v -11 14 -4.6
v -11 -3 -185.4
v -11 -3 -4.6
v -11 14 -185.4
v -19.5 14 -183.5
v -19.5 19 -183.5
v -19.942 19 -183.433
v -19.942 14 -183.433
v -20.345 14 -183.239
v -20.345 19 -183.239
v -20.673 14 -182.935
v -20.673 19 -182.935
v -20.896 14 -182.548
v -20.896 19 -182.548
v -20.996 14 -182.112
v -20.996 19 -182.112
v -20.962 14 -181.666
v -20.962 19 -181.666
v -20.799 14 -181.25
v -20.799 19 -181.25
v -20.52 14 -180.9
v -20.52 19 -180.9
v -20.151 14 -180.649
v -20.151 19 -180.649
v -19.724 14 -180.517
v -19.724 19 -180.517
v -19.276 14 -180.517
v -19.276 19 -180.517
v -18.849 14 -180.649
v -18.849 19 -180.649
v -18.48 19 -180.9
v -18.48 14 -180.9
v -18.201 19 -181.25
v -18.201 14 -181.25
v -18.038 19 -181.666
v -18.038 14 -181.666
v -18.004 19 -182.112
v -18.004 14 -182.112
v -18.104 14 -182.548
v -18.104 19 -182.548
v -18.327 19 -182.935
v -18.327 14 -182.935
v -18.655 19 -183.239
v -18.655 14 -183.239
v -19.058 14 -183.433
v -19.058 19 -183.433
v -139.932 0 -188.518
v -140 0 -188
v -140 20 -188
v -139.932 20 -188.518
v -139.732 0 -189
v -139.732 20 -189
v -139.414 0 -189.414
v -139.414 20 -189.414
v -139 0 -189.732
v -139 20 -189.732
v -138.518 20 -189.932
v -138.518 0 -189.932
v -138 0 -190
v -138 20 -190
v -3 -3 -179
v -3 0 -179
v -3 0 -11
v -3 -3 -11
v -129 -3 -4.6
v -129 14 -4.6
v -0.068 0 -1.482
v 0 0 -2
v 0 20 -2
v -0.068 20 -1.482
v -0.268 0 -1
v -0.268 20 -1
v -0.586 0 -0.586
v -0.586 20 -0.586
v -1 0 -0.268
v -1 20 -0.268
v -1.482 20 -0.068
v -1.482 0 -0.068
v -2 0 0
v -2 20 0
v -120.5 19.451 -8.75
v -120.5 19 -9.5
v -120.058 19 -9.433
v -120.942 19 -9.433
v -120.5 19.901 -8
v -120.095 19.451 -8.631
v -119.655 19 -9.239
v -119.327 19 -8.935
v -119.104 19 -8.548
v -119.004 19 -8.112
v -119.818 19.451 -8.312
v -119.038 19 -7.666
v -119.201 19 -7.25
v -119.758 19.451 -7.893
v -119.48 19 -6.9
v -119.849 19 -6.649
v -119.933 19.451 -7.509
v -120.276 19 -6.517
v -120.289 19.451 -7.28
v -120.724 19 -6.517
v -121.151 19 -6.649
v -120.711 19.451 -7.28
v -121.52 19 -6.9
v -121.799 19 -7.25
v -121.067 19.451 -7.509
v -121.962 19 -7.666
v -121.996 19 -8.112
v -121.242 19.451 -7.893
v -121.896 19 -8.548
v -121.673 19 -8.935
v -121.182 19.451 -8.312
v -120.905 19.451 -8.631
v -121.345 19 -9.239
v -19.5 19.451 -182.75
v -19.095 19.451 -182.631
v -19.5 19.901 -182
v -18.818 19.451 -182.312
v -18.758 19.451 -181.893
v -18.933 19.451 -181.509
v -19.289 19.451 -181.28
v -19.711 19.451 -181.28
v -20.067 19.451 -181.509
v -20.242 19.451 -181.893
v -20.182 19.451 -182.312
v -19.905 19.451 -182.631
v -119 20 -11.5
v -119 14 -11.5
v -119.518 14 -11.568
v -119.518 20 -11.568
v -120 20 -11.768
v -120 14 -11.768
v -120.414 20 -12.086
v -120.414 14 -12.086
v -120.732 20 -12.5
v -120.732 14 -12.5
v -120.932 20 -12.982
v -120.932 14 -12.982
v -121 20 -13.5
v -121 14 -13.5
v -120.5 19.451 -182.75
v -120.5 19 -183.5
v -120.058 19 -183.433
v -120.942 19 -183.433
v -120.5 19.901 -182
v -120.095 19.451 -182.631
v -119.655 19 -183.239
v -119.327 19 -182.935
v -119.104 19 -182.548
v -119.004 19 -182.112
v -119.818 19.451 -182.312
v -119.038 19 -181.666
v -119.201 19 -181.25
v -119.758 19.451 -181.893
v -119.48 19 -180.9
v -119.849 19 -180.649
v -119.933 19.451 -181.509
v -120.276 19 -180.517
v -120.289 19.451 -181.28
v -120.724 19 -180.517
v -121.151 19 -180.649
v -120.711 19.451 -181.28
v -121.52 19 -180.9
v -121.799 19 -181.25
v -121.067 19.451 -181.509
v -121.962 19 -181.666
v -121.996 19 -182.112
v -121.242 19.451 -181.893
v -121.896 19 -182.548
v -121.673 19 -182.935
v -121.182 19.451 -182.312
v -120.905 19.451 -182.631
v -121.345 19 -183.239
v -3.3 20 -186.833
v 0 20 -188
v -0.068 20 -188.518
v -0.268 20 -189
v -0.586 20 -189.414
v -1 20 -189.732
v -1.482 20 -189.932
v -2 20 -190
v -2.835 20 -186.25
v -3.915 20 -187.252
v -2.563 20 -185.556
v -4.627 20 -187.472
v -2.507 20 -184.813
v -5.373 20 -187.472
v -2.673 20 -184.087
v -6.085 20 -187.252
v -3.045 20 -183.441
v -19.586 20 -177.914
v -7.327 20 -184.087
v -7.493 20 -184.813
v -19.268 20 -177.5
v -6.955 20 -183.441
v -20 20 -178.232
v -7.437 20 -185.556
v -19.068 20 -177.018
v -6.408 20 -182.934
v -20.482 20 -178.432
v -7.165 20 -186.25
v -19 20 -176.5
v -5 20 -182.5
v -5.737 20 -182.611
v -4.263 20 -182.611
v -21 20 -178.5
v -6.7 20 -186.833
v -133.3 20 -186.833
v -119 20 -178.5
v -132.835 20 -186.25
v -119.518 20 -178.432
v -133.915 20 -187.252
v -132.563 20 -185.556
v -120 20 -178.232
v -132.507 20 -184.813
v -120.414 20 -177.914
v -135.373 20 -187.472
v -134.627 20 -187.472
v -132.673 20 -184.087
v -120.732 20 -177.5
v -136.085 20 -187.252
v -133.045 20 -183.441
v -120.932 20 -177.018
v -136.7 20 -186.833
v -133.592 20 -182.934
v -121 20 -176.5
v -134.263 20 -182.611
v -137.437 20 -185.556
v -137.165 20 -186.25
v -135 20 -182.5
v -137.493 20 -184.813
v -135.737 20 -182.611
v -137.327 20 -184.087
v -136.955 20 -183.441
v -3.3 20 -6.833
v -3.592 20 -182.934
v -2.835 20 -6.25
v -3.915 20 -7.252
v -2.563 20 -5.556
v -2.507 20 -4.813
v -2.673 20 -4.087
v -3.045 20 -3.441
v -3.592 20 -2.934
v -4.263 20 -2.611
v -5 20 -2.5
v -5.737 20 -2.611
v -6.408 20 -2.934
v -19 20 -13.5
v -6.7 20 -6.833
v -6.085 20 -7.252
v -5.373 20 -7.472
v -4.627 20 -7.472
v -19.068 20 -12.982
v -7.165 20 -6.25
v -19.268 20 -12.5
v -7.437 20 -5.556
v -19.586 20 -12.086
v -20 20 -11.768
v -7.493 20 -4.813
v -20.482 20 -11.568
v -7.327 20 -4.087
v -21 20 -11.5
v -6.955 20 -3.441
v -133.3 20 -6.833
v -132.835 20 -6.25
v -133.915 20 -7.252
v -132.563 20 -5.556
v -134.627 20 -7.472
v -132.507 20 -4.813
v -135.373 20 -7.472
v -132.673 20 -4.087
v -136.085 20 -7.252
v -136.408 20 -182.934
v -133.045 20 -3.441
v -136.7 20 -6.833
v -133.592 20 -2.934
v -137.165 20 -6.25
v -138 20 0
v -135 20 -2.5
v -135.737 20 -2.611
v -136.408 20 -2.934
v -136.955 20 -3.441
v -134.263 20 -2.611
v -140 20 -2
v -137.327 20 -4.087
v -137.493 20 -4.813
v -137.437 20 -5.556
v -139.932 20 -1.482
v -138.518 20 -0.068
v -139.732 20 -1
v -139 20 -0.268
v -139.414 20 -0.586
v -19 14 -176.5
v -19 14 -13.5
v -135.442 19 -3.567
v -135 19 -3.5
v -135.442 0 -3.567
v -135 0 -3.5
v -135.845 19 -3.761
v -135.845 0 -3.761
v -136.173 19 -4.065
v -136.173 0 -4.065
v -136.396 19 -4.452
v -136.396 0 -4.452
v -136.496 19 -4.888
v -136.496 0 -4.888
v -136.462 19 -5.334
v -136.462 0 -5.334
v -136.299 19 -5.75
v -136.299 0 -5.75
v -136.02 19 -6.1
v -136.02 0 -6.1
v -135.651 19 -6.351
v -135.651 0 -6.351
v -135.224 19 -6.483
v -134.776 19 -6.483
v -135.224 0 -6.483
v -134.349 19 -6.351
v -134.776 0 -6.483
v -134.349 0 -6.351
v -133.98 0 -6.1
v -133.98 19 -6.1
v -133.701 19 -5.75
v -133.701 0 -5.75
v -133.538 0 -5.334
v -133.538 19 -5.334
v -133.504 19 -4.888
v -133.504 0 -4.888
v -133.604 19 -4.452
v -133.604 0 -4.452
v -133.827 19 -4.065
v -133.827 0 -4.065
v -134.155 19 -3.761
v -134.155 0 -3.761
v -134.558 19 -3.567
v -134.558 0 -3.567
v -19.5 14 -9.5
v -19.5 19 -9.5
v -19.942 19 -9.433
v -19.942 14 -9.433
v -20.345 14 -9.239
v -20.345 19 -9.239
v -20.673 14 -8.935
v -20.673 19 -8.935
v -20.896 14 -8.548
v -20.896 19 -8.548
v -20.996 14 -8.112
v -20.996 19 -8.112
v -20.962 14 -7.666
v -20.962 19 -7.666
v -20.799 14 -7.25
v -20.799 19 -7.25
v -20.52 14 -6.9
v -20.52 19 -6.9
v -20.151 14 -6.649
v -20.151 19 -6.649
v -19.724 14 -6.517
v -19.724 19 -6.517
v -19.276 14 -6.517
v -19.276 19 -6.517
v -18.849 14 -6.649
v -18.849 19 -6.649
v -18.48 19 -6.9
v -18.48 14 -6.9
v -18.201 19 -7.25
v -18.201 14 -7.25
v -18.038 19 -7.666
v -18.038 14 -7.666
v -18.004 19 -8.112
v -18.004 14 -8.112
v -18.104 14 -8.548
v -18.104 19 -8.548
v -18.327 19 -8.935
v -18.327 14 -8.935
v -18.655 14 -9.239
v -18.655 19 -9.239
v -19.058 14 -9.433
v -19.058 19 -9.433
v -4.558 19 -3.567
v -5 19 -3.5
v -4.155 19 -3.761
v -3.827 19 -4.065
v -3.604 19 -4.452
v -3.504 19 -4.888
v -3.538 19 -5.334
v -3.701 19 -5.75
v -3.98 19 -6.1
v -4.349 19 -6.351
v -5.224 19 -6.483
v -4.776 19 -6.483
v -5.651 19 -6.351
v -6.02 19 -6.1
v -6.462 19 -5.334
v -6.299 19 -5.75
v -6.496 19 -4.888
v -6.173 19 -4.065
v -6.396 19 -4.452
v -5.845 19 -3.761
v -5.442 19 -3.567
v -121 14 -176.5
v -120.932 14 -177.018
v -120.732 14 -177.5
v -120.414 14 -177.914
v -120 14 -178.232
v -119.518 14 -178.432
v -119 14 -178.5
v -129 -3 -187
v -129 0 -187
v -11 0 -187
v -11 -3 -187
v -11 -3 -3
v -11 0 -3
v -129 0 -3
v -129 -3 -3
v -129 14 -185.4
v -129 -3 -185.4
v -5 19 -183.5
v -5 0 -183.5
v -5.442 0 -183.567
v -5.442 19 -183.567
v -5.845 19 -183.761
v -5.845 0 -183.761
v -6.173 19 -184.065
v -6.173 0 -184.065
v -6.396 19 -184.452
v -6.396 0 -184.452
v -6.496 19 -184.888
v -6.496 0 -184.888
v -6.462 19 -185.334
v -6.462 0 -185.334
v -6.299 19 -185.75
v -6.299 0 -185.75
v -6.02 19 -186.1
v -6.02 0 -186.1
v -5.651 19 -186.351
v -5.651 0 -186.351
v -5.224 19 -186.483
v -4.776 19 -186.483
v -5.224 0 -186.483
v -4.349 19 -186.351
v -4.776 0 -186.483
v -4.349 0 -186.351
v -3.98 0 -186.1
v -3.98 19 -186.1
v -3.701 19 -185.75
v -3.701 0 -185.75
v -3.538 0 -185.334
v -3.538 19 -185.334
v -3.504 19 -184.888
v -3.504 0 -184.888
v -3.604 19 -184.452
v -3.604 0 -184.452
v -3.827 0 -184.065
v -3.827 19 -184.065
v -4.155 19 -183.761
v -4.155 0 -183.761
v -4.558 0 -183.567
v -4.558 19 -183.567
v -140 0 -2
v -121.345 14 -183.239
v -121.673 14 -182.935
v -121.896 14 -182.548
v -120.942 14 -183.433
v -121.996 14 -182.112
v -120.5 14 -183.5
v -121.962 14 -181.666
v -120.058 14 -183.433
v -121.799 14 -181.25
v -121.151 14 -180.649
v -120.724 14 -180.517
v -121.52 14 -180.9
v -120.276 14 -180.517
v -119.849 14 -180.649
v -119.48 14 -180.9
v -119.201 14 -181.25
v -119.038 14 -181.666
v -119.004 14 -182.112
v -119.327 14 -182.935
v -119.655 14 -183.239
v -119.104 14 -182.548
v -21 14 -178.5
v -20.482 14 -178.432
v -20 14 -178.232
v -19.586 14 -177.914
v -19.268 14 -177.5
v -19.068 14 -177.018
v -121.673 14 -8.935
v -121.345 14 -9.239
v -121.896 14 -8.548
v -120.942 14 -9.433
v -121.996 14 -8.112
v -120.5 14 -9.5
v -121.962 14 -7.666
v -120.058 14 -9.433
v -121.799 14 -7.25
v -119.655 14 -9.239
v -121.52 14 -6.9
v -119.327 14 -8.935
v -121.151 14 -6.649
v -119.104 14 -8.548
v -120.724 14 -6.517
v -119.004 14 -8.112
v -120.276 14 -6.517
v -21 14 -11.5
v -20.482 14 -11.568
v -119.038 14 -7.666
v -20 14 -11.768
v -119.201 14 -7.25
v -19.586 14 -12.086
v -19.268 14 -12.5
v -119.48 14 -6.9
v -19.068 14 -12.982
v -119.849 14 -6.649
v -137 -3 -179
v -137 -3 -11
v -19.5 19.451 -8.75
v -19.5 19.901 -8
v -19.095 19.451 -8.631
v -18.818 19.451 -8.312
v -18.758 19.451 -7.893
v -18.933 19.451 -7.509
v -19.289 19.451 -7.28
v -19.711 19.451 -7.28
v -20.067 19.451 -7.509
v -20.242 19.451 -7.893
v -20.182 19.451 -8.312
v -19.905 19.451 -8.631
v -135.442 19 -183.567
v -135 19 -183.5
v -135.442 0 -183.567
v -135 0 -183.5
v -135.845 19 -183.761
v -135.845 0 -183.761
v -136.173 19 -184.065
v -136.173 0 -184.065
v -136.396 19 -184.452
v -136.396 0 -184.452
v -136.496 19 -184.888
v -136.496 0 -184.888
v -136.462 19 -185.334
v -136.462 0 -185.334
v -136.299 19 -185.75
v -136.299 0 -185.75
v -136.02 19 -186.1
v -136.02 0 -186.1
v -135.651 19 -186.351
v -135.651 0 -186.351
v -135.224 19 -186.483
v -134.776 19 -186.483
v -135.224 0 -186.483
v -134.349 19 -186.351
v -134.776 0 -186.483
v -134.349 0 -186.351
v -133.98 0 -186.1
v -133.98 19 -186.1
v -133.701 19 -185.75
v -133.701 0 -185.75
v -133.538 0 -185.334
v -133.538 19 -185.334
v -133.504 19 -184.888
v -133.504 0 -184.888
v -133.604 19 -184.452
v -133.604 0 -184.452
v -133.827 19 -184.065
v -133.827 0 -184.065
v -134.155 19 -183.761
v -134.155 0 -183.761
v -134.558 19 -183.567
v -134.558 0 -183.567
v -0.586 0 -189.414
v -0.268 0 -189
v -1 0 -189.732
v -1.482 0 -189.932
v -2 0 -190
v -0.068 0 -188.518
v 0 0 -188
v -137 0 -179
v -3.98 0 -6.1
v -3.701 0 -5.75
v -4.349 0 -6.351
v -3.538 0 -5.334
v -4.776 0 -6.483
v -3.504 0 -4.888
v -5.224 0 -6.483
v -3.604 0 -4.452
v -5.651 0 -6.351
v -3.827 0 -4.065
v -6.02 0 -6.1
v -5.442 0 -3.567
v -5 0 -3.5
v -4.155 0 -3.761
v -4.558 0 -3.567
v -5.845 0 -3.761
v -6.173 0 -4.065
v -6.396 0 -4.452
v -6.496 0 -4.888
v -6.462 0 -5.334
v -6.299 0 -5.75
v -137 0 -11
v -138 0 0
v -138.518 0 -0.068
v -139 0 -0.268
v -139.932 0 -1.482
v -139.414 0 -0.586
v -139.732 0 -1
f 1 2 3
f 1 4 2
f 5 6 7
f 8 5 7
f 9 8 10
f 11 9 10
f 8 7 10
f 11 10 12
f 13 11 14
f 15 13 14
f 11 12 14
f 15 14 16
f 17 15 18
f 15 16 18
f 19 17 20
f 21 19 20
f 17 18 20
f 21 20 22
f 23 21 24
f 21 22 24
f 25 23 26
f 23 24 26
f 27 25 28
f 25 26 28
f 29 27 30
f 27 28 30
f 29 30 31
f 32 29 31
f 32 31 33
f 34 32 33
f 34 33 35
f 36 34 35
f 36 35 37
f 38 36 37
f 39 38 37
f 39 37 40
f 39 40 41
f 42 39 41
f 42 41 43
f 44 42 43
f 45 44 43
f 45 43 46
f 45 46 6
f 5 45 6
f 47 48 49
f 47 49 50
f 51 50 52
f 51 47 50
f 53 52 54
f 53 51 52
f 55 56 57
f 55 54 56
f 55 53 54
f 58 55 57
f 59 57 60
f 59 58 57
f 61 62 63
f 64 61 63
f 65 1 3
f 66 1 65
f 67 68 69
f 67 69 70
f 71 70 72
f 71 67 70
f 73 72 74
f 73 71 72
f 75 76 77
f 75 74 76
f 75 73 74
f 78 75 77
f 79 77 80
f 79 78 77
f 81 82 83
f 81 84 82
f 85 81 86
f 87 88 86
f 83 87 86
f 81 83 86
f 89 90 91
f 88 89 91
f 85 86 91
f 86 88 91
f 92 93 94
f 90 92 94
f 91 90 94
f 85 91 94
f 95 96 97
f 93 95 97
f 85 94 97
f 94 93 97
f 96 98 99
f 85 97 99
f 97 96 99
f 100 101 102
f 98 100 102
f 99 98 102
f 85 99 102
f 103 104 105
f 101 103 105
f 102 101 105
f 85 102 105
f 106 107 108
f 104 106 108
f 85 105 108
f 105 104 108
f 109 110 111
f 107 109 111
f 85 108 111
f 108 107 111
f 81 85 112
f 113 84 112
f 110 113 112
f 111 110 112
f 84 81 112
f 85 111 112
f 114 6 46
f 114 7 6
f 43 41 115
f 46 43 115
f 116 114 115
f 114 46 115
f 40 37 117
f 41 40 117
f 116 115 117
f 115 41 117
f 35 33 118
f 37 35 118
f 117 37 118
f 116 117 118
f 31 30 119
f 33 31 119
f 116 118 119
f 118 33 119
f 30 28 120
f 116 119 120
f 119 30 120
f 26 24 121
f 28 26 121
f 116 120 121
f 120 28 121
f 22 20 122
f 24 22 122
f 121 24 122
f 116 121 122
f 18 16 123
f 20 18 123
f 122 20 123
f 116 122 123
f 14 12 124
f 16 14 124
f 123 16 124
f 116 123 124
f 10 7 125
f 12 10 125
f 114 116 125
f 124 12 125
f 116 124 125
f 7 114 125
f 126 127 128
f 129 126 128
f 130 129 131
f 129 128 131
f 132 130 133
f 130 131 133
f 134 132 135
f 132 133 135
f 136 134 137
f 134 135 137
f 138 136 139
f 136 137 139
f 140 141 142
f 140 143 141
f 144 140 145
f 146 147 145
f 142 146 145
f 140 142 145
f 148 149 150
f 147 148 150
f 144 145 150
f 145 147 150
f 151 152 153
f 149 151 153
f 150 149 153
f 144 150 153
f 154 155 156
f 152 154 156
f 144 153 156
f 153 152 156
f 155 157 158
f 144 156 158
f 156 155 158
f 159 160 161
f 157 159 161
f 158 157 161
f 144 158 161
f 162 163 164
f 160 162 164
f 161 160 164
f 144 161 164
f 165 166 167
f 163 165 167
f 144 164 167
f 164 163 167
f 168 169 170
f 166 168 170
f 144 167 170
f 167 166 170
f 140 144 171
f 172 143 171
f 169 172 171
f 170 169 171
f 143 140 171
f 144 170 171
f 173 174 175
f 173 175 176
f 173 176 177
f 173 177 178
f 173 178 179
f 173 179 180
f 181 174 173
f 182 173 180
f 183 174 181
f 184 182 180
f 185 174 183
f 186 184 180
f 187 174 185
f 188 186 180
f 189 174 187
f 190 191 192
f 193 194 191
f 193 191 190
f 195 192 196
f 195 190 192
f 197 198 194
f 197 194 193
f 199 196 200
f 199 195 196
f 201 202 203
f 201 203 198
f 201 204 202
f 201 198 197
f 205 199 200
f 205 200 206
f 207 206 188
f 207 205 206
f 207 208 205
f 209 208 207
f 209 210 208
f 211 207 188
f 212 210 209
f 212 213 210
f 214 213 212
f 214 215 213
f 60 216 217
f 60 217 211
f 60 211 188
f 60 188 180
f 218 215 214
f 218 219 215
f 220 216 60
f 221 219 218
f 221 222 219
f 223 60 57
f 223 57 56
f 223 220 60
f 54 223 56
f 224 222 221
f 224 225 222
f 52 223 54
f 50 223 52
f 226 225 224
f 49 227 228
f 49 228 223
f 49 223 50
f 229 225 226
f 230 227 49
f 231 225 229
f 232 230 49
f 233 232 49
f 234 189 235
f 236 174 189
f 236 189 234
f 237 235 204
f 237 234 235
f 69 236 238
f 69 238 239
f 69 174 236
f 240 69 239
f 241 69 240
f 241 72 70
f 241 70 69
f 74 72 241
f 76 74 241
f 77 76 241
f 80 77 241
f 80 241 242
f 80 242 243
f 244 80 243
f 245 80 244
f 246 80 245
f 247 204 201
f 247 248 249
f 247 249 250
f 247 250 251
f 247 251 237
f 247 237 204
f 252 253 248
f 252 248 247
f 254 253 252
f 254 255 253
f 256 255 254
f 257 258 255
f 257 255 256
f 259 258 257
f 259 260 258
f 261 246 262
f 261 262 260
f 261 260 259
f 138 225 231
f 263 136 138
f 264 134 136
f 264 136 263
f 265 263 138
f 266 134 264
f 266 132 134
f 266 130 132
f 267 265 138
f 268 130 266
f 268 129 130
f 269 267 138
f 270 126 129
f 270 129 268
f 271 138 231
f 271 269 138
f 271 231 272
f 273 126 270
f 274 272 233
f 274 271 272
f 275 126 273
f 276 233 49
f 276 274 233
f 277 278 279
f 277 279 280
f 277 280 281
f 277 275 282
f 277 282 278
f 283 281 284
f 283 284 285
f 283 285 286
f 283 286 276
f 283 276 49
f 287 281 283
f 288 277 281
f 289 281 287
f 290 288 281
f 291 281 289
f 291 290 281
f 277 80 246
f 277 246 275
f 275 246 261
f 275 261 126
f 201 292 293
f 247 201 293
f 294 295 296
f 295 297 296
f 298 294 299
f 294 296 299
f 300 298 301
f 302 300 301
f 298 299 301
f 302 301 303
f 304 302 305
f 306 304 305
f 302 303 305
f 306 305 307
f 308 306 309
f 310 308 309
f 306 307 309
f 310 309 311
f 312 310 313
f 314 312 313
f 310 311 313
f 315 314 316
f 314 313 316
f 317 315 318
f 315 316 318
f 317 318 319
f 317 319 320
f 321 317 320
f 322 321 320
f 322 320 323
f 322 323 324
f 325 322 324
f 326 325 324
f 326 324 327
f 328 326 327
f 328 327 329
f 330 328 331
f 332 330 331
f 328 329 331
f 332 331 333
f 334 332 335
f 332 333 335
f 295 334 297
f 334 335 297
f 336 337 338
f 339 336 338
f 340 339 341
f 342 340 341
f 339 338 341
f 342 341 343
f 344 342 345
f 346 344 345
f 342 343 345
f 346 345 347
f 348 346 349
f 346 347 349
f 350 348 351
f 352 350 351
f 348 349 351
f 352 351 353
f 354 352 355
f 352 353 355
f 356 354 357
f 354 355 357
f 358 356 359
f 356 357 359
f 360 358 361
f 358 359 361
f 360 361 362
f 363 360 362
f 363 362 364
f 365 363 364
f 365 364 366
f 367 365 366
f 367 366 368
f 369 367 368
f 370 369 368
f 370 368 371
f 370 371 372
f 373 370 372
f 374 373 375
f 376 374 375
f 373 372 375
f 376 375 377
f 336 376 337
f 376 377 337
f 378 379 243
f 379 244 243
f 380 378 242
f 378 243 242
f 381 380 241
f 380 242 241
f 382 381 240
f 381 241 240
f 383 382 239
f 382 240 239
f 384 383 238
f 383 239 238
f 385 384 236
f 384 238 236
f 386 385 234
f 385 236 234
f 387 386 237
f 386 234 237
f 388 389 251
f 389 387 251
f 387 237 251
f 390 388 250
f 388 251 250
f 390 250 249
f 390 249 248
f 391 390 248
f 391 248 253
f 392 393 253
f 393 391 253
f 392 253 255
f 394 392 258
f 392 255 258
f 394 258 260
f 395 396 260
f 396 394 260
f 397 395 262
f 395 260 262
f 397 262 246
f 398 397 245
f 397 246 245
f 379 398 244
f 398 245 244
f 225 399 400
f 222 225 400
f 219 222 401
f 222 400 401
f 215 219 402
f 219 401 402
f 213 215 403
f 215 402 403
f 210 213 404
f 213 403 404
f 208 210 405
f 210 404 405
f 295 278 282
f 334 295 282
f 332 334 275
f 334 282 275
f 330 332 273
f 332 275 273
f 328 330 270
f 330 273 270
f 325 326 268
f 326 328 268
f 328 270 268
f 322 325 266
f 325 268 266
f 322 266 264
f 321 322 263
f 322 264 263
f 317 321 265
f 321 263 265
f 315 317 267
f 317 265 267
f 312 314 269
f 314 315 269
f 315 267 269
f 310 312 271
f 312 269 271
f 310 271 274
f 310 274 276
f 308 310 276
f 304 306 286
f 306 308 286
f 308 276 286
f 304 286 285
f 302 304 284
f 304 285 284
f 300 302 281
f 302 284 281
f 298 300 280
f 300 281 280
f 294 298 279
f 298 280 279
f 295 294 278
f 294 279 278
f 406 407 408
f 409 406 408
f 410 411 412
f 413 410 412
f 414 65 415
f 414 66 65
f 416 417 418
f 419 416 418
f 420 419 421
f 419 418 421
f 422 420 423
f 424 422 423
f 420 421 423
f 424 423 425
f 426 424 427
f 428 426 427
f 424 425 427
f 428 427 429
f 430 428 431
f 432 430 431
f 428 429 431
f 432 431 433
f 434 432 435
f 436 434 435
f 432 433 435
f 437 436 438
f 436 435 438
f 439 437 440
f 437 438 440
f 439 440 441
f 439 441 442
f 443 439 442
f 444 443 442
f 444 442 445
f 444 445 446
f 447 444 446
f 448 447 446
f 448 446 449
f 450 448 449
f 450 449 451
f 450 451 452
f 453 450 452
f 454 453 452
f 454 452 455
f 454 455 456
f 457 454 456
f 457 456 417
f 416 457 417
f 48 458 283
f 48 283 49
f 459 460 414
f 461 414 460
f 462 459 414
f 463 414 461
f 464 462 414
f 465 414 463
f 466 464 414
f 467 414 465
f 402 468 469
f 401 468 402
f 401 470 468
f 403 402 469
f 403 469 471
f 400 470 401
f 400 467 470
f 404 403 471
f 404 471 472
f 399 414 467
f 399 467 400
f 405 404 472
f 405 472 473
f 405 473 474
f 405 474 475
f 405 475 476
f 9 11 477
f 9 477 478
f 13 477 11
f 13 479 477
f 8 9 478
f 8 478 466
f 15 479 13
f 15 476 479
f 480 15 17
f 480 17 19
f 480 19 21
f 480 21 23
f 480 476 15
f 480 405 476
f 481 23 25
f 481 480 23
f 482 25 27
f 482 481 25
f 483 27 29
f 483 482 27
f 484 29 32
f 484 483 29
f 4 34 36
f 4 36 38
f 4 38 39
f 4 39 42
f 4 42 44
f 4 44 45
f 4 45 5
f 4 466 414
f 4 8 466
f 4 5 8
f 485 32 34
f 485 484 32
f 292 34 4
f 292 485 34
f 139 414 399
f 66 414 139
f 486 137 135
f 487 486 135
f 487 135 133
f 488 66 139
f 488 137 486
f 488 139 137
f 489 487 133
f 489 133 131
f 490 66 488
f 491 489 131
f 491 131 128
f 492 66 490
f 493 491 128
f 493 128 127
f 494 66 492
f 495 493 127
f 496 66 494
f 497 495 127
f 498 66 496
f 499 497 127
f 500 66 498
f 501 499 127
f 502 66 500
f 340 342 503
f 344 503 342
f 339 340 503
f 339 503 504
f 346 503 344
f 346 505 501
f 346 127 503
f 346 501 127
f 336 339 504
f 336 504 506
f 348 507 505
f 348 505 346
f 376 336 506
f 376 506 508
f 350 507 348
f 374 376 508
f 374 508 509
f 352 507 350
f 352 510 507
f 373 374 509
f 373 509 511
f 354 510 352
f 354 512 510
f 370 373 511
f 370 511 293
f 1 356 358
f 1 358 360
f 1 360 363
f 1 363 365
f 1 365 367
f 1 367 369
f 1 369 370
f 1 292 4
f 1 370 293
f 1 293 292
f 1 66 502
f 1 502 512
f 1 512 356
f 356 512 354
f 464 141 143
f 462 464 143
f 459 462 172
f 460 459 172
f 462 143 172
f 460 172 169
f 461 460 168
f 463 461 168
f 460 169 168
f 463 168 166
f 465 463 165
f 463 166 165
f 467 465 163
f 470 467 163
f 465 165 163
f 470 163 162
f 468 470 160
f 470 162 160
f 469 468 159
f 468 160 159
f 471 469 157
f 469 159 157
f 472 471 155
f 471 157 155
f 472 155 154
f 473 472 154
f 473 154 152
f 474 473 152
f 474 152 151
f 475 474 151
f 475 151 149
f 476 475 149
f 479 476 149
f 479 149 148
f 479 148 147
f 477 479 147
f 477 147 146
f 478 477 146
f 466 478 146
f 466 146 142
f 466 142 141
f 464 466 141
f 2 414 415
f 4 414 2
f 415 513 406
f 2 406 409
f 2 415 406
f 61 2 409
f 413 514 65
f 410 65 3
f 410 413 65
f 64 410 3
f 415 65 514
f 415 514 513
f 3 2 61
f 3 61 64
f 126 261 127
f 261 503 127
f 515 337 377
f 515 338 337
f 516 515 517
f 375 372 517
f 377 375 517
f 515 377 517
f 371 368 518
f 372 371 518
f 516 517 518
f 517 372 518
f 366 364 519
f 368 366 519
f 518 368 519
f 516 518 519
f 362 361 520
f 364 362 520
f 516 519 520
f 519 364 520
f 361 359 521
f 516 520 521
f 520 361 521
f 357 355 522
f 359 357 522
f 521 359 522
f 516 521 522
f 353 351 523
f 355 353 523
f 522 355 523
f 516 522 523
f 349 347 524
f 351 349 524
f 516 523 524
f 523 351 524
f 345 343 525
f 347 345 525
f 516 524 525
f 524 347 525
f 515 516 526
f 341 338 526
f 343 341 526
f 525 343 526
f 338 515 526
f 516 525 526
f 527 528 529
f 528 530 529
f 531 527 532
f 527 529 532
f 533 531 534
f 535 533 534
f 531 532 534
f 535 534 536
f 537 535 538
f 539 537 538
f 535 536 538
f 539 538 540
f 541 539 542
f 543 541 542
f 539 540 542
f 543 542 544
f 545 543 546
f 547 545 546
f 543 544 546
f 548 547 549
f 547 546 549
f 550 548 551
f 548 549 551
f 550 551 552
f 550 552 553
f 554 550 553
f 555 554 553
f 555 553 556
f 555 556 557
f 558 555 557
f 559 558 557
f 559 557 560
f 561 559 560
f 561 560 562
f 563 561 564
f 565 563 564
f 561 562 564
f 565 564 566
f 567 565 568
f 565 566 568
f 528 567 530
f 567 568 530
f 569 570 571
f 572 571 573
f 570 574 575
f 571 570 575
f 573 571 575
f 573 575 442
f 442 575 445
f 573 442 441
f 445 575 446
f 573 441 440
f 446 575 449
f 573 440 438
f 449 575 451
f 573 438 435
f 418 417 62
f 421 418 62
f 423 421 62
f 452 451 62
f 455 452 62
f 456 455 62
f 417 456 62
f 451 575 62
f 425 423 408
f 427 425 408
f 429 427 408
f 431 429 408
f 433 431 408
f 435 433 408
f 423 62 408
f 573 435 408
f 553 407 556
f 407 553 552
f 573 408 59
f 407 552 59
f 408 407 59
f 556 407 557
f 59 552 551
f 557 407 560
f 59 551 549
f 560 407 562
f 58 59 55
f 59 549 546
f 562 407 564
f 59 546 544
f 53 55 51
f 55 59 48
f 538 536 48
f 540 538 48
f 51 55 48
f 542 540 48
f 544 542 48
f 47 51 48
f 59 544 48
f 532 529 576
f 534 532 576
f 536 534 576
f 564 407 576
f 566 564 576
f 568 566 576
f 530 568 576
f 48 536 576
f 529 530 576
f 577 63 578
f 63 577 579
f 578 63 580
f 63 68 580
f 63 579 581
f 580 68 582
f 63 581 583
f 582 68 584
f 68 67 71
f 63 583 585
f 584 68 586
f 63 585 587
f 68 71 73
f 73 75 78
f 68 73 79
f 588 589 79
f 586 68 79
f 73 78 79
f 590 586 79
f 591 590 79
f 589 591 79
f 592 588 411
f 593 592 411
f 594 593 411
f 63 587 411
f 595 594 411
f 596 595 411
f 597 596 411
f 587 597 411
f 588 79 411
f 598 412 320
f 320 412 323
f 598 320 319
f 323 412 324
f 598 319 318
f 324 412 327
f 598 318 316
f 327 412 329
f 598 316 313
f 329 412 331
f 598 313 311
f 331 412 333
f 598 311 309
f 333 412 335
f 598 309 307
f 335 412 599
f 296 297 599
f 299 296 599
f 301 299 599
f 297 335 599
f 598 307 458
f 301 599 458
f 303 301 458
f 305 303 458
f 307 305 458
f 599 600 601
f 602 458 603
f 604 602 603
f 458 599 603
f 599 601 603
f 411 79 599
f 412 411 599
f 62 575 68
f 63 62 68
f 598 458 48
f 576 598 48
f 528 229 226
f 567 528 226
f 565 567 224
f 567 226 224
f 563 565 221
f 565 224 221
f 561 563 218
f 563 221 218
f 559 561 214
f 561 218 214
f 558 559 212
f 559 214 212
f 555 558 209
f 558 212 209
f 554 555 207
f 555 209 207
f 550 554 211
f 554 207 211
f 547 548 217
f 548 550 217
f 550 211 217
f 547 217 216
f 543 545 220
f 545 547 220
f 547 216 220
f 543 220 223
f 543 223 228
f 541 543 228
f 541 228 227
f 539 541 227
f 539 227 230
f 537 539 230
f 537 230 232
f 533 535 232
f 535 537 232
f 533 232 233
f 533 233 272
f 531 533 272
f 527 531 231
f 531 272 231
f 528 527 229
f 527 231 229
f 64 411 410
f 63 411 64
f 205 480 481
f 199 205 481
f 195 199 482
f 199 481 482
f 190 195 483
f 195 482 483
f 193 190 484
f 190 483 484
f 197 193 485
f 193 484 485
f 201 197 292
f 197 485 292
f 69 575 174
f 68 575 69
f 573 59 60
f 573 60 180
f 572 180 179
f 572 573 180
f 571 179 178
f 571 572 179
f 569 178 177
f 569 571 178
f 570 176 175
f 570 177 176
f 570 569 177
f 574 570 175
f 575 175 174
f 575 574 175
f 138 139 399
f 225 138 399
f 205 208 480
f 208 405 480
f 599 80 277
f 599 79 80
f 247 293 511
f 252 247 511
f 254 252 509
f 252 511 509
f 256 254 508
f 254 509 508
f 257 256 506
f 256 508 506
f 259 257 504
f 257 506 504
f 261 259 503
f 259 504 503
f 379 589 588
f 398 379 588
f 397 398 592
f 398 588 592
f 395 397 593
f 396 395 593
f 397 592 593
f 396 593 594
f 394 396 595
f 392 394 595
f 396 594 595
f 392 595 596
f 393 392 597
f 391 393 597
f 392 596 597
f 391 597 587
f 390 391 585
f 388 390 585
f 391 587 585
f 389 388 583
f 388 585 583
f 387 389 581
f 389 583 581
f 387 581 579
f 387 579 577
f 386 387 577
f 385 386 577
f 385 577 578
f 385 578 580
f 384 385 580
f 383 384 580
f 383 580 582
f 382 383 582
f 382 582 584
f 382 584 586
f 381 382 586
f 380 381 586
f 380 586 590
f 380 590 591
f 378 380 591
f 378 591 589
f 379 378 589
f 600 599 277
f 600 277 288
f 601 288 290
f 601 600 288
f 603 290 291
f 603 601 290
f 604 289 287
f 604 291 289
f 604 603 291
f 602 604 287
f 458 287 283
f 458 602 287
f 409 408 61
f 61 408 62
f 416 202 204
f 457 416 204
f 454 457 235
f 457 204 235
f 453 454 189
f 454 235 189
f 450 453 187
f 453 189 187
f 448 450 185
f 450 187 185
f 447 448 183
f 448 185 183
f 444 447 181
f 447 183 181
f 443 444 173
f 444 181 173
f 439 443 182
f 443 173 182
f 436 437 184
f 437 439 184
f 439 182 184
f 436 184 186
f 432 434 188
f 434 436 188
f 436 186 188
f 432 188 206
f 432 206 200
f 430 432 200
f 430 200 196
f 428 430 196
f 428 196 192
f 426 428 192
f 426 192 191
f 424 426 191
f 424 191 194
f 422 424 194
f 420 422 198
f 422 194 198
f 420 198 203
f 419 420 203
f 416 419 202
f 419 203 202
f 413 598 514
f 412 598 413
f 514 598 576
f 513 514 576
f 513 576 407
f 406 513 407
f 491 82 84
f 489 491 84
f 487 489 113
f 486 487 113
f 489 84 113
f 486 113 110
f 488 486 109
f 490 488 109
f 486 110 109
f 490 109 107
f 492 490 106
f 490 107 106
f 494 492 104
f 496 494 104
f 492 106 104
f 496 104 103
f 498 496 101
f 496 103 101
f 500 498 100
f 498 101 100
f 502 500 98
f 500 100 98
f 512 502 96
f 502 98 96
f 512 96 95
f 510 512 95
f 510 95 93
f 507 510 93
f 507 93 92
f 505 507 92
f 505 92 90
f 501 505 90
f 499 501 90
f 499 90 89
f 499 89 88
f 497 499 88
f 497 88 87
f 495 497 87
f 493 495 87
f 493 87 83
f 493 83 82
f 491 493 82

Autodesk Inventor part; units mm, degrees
ref_plane "YZ Plane" through (0, 0, 0) normal (1, 0, 0) x (0, 1, 0)
ref_plane "XZ Plane" through (0, 0, 0) normal (0, 1, 0) x (-1, 0, 0)
ref_plane "XY Plane" through (0, 0, 0) normal (0, 0, 1) x (1, 0, 0)
sketch "Sketch1" plane through (0, 0, 0) normal (0, 1, 0) x (-1, 0, 0)
  line L0 (2, 0) -> (138, 0)
  line L1 (140, -2) -> (140, -188)
  line L2 (138, -190) -> (2, -190)
  line L3 (0, -188) -> (0, -2)
  arc A0 (140, -2) -> (138, 0) centre (138, -2) ccw
  arc A1 (2, 0) -> (0, -2) centre (2, -2) ccw
  arc A2 (0, -188) -> (2, -190) centre (2, -188) ccw
  arc A3 (138, -190) -> (140, -188) centre (138, -188) ccw
  line L4 (21, -11.5) -> (119, -11.5)
  line L5 (121, -13.5) -> (121, -176.5)
  line L6 (119, -178.5) -> (21, -178.5)
  line L7 (19, -176.5) -> (19, -13.5)
  arc A4 (121, -13.5) -> (119, -11.5) centre (119, -13.5) ccw
  arc A5 (119, -178.5) -> (121, -176.5) centre (119, -176.5) ccw
  arc A6 (19, -176.5) -> (21, -178.5) centre (21, -176.5) ccw
  arc A7 (21, -11.5) -> (19, -13.5) centre (21, -13.5) ccw
  point P0 (0, 0)
  point P1 (140, -190)
  point P2 (140, 0)
  point P3 (0, -190)
  point P4 (121, -178.5)
  point P5 (121, -11.5)
  point P6 (19, -178.5)
  dimension "d5" = 190
  dimension "d6" = 140
  dimension "d7" = 102
  dimension "d8" = 167
  dimension "d9" = 2
  dimension "d57" = 11.5
  dimension "d58" = 19
extrude "Extrusion1" add sketch "Sketch1" along normal blind 20
sketch "Sketch2" plane through (0, 0, 0) normal (0, -1, 0) x (1, 0, 0)
  line L0 (-11, -3) -> (-129, -3)
  line L1 (-137, -11) -> (-137, -179)
  line L2 (-129, -187) -> (-11, -187)
  line L3 (-3, -179) -> (-3, -11)
  line L4 (-137, -179) -> (-129, -187)
  line L5 (-137, -11) -> (-129, -3)
  line L6 (-11, -3) -> (-3, -11)
  line L7 (-11, -187) -> (-3, -179)
  line L8 (-129, -187) -> (-129, -185.4)
  line L9 (-129, -185.4) -> (-11, -185.4)
  line L10 (-11, -185.4) -> (-11, -4.6)
  line L11 (-11, -4.6) -> (-129, -4.6)
  line L12 (-129, -4.6) -> (-129, -185.4)
  point P0 (0, 0)
  point P1 (-3, -3)
  point P2 (-137, -187)
  point P3 (-137, -3)
  point P4 (-3, -187)
  dimension "d86" = 134
  dimension "d87" = 184
  dimension "d88" = 8
  dimension "d89" = 8
  dimension "d90" = 8
  dimension "d91" = 8
  dimension "d92" = 8
  dimension "d93" = 8
  dimension "d94" = 8
  dimension "d95" = 8
  dimension "d96" = 1.6
  dimension "d97" = 180.8
  dimension "d98" = 180.8
extrude "Extrusion2" add sketch "Sketch2" along normal blind 3
hole "Hole1" at (-135, 20, -5) direction (0, -1, 0) diameter 3 end through all countersink diameter 5 countersink angle 90
hole "Hole2" at (-135, 20, -185) direction (0, -1, 0) diameter 3 end through all countersink diameter 5 countersink angle 90
hole "Hole3" at (-5, 20, -185) direction (0, -1, 0) diameter 3 end through all countersink diameter 5 countersink angle 90
hole "Hole4" at (-5, 20, -5) direction (0, -1, 0) diameter 3 end through all countersink diameter 5 countersink angle 90
hole "Hole5" at (-120.5, 0, -8) direction (0, 1, 0) diameter 3 depth 19 tip angle 118
hole "Hole6" at (-19.5, 0, -8) direction (0, 1, 0) diameter 3 depth 19 tip angle 118
hole "Hole7" at (-120.5, 0, -182) direction (0, 1, 0) diameter 3 depth 19 tip angle 118
hole "Hole8" at (-19.5, 0, -182) direction (0, 1, 0) diameter 3 depth 19 tip angle 118
sketch "Sketch3" plane through (0, 0, 0) normal (0, -1, 0) x (1, 0, 0)
  line L0 (-11, -185.4) -> (-11, -4.6) projected
  line L1 (-129, -4.6) -> (-11, -4.6) projected
  line L2 (-11, -185.4) -> (-129, -185.4)
  line L3 (-129, -185.4) -> (-129, -4.6)
  line L4 (-129, -4.6) -> (-11, -4.6)
  line L5 (-11, -4.6) -> (-11, -185.4)
  point P0 (0, 0)
extrude "Extrusion3" cut sketch "Sketch3" against normal blind 14
equation "\"d89\" = d88"
equation "\"d90\" = d88"
equation "\"d91\" = d90"
equation "\"d92\" = d88"
equation "\"d93\" = d92"
equation "\"d94\" = d88"
equation "\"d95\" = d94"
properties part number "Dessus boitier"
